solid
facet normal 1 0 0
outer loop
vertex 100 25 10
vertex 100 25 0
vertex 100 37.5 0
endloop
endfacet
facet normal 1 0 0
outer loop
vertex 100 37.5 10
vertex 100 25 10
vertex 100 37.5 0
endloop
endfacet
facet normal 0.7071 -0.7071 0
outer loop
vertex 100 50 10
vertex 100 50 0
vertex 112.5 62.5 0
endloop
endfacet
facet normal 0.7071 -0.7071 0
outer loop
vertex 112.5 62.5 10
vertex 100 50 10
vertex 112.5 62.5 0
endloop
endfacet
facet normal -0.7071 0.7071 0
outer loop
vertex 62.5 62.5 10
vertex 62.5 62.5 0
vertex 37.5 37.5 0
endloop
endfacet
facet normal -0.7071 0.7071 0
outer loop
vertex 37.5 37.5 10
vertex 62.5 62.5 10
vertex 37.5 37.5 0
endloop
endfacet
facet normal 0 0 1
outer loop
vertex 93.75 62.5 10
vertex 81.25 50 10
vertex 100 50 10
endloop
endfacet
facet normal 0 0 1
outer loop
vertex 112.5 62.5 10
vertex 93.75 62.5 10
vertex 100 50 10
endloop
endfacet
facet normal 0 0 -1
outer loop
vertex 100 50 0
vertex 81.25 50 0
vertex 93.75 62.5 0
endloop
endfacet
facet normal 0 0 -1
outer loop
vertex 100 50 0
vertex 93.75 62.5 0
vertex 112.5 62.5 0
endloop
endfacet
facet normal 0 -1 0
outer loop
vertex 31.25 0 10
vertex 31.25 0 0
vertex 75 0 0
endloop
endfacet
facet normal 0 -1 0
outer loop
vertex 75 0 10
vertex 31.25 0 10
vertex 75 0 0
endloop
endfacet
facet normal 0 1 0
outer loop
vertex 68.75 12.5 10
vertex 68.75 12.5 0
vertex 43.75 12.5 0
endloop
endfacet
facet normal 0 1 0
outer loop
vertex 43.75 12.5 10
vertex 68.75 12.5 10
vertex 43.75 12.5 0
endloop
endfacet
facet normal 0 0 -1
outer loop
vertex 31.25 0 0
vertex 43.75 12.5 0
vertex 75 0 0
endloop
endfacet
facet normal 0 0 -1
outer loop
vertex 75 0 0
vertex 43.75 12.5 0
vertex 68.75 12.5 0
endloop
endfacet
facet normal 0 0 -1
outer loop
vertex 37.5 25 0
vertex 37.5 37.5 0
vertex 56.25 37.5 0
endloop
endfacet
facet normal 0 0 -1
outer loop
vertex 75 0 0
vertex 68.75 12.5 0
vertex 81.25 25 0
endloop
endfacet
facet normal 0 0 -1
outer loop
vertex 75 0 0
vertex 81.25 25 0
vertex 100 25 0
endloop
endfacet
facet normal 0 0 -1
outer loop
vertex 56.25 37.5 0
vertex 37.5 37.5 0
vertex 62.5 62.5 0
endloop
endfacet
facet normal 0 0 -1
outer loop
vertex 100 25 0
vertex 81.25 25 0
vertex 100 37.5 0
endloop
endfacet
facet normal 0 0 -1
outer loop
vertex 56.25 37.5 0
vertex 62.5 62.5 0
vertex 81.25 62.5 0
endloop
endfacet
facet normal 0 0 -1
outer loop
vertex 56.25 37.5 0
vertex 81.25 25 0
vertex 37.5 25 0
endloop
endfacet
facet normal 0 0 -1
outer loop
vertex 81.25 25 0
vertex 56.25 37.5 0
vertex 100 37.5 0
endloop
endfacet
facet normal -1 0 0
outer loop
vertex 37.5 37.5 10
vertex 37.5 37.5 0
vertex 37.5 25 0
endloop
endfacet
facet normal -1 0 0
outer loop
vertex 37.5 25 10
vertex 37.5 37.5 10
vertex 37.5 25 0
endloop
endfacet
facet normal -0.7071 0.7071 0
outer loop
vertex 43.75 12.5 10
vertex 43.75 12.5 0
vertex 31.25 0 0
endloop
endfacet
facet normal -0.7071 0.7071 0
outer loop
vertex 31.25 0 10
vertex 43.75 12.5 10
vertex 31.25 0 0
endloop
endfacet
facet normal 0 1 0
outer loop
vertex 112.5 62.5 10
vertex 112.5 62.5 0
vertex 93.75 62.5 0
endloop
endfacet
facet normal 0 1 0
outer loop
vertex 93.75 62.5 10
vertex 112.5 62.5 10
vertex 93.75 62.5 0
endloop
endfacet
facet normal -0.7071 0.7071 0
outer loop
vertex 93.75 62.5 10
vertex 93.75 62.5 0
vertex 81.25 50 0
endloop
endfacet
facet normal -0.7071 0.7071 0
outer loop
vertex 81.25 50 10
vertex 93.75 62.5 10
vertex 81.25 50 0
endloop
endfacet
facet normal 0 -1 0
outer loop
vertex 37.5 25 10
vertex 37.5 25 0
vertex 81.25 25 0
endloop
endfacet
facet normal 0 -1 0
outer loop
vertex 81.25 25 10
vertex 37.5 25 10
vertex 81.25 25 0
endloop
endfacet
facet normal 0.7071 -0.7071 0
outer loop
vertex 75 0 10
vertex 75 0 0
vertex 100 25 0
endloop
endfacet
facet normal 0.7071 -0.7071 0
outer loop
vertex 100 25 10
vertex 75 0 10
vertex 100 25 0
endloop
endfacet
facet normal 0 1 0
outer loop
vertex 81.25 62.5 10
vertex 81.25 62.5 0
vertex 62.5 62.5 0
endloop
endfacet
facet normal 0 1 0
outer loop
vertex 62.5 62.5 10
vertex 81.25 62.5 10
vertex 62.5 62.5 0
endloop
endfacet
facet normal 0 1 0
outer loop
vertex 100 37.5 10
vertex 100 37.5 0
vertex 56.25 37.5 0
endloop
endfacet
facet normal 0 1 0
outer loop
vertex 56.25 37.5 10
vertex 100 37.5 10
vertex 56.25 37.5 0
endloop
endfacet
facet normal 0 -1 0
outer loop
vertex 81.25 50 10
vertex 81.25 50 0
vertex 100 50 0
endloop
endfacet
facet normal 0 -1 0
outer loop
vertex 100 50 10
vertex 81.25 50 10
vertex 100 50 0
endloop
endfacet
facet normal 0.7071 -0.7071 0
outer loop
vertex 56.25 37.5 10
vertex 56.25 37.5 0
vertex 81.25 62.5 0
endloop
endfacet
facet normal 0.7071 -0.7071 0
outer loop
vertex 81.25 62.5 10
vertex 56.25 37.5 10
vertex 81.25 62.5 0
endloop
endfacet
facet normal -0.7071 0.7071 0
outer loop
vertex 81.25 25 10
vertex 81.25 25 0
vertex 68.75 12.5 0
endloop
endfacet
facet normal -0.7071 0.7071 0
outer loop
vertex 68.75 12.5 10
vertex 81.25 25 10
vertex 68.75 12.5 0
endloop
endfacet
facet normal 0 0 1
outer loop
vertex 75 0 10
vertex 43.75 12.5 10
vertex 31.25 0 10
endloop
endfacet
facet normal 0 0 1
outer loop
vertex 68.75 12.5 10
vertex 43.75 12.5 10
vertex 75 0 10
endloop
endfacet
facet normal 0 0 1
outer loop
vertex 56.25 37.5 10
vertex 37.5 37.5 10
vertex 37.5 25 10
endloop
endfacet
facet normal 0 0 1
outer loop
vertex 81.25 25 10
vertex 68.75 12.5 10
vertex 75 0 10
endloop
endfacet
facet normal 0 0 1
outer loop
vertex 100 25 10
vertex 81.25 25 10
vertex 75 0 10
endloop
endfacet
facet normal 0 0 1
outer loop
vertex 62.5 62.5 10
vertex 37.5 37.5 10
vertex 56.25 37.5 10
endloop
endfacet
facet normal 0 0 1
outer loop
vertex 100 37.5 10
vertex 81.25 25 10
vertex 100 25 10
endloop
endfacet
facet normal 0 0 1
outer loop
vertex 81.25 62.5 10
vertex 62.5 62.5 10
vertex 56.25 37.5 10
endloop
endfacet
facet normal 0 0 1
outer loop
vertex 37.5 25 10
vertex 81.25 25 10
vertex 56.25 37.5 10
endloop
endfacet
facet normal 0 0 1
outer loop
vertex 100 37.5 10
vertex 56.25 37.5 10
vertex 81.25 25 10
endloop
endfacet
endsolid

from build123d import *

# Parameters (mm, degrees)
BOSS_EXTRUDE1_DEPTH = 10


with BuildPart() as part:
    # Sketch1 → Boss-Extrude1 (new body)
    with BuildSketch(Plane.XY):
        Polygon((100, 62.5), (87.5, 50), (100, 50), (112.5, 62.5), align=None)
        Polygon((93.75, 62.5), (81.25, 50), (87.5, 50), (100, 62.5), align=None)
        Polygon((62.5, 62.5), (50, 50), (68.75, 50), (81.25, 62.5), align=None)
        Polygon((50, 50), (37.5, 37.5), (56.25, 37.5), (68.75, 50), align=None)
        Polygon((37.5, 25), (43.75, 25), (56.25, 37.5), (37.5, 37.5), align=None)
        Polygon((56.25, 37.5), (43.75, 25), (62.5, 25), (75, 37.5), align=None)
        Polygon((75, 37.5), (62.5, 25), (81.25, 25), (93.75, 37.5), align=None)
        Polygon((93.75, 37.5), (81.25, 25), (100, 25), (100, 37.5), align=None)
        Polygon((81.25, 25), (68.75, 12.5), (87.5, 12.5), (100, 25), align=None)
        Polygon((68.75, 12.5), (56.25, 0), (75, 0), (87.5, 12.5), align=None)
        Polygon((50, 12.5), (37.5, 0), (56.25, 0), (68.75, 12.5), align=None)
        Polygon((43.75, 12.5), (31.25, 0), (37.5, 0), (50, 12.5), align=None)
    extrude(amount=BOSS_EXTRUDE1_DEPTH)


solid = part.part
